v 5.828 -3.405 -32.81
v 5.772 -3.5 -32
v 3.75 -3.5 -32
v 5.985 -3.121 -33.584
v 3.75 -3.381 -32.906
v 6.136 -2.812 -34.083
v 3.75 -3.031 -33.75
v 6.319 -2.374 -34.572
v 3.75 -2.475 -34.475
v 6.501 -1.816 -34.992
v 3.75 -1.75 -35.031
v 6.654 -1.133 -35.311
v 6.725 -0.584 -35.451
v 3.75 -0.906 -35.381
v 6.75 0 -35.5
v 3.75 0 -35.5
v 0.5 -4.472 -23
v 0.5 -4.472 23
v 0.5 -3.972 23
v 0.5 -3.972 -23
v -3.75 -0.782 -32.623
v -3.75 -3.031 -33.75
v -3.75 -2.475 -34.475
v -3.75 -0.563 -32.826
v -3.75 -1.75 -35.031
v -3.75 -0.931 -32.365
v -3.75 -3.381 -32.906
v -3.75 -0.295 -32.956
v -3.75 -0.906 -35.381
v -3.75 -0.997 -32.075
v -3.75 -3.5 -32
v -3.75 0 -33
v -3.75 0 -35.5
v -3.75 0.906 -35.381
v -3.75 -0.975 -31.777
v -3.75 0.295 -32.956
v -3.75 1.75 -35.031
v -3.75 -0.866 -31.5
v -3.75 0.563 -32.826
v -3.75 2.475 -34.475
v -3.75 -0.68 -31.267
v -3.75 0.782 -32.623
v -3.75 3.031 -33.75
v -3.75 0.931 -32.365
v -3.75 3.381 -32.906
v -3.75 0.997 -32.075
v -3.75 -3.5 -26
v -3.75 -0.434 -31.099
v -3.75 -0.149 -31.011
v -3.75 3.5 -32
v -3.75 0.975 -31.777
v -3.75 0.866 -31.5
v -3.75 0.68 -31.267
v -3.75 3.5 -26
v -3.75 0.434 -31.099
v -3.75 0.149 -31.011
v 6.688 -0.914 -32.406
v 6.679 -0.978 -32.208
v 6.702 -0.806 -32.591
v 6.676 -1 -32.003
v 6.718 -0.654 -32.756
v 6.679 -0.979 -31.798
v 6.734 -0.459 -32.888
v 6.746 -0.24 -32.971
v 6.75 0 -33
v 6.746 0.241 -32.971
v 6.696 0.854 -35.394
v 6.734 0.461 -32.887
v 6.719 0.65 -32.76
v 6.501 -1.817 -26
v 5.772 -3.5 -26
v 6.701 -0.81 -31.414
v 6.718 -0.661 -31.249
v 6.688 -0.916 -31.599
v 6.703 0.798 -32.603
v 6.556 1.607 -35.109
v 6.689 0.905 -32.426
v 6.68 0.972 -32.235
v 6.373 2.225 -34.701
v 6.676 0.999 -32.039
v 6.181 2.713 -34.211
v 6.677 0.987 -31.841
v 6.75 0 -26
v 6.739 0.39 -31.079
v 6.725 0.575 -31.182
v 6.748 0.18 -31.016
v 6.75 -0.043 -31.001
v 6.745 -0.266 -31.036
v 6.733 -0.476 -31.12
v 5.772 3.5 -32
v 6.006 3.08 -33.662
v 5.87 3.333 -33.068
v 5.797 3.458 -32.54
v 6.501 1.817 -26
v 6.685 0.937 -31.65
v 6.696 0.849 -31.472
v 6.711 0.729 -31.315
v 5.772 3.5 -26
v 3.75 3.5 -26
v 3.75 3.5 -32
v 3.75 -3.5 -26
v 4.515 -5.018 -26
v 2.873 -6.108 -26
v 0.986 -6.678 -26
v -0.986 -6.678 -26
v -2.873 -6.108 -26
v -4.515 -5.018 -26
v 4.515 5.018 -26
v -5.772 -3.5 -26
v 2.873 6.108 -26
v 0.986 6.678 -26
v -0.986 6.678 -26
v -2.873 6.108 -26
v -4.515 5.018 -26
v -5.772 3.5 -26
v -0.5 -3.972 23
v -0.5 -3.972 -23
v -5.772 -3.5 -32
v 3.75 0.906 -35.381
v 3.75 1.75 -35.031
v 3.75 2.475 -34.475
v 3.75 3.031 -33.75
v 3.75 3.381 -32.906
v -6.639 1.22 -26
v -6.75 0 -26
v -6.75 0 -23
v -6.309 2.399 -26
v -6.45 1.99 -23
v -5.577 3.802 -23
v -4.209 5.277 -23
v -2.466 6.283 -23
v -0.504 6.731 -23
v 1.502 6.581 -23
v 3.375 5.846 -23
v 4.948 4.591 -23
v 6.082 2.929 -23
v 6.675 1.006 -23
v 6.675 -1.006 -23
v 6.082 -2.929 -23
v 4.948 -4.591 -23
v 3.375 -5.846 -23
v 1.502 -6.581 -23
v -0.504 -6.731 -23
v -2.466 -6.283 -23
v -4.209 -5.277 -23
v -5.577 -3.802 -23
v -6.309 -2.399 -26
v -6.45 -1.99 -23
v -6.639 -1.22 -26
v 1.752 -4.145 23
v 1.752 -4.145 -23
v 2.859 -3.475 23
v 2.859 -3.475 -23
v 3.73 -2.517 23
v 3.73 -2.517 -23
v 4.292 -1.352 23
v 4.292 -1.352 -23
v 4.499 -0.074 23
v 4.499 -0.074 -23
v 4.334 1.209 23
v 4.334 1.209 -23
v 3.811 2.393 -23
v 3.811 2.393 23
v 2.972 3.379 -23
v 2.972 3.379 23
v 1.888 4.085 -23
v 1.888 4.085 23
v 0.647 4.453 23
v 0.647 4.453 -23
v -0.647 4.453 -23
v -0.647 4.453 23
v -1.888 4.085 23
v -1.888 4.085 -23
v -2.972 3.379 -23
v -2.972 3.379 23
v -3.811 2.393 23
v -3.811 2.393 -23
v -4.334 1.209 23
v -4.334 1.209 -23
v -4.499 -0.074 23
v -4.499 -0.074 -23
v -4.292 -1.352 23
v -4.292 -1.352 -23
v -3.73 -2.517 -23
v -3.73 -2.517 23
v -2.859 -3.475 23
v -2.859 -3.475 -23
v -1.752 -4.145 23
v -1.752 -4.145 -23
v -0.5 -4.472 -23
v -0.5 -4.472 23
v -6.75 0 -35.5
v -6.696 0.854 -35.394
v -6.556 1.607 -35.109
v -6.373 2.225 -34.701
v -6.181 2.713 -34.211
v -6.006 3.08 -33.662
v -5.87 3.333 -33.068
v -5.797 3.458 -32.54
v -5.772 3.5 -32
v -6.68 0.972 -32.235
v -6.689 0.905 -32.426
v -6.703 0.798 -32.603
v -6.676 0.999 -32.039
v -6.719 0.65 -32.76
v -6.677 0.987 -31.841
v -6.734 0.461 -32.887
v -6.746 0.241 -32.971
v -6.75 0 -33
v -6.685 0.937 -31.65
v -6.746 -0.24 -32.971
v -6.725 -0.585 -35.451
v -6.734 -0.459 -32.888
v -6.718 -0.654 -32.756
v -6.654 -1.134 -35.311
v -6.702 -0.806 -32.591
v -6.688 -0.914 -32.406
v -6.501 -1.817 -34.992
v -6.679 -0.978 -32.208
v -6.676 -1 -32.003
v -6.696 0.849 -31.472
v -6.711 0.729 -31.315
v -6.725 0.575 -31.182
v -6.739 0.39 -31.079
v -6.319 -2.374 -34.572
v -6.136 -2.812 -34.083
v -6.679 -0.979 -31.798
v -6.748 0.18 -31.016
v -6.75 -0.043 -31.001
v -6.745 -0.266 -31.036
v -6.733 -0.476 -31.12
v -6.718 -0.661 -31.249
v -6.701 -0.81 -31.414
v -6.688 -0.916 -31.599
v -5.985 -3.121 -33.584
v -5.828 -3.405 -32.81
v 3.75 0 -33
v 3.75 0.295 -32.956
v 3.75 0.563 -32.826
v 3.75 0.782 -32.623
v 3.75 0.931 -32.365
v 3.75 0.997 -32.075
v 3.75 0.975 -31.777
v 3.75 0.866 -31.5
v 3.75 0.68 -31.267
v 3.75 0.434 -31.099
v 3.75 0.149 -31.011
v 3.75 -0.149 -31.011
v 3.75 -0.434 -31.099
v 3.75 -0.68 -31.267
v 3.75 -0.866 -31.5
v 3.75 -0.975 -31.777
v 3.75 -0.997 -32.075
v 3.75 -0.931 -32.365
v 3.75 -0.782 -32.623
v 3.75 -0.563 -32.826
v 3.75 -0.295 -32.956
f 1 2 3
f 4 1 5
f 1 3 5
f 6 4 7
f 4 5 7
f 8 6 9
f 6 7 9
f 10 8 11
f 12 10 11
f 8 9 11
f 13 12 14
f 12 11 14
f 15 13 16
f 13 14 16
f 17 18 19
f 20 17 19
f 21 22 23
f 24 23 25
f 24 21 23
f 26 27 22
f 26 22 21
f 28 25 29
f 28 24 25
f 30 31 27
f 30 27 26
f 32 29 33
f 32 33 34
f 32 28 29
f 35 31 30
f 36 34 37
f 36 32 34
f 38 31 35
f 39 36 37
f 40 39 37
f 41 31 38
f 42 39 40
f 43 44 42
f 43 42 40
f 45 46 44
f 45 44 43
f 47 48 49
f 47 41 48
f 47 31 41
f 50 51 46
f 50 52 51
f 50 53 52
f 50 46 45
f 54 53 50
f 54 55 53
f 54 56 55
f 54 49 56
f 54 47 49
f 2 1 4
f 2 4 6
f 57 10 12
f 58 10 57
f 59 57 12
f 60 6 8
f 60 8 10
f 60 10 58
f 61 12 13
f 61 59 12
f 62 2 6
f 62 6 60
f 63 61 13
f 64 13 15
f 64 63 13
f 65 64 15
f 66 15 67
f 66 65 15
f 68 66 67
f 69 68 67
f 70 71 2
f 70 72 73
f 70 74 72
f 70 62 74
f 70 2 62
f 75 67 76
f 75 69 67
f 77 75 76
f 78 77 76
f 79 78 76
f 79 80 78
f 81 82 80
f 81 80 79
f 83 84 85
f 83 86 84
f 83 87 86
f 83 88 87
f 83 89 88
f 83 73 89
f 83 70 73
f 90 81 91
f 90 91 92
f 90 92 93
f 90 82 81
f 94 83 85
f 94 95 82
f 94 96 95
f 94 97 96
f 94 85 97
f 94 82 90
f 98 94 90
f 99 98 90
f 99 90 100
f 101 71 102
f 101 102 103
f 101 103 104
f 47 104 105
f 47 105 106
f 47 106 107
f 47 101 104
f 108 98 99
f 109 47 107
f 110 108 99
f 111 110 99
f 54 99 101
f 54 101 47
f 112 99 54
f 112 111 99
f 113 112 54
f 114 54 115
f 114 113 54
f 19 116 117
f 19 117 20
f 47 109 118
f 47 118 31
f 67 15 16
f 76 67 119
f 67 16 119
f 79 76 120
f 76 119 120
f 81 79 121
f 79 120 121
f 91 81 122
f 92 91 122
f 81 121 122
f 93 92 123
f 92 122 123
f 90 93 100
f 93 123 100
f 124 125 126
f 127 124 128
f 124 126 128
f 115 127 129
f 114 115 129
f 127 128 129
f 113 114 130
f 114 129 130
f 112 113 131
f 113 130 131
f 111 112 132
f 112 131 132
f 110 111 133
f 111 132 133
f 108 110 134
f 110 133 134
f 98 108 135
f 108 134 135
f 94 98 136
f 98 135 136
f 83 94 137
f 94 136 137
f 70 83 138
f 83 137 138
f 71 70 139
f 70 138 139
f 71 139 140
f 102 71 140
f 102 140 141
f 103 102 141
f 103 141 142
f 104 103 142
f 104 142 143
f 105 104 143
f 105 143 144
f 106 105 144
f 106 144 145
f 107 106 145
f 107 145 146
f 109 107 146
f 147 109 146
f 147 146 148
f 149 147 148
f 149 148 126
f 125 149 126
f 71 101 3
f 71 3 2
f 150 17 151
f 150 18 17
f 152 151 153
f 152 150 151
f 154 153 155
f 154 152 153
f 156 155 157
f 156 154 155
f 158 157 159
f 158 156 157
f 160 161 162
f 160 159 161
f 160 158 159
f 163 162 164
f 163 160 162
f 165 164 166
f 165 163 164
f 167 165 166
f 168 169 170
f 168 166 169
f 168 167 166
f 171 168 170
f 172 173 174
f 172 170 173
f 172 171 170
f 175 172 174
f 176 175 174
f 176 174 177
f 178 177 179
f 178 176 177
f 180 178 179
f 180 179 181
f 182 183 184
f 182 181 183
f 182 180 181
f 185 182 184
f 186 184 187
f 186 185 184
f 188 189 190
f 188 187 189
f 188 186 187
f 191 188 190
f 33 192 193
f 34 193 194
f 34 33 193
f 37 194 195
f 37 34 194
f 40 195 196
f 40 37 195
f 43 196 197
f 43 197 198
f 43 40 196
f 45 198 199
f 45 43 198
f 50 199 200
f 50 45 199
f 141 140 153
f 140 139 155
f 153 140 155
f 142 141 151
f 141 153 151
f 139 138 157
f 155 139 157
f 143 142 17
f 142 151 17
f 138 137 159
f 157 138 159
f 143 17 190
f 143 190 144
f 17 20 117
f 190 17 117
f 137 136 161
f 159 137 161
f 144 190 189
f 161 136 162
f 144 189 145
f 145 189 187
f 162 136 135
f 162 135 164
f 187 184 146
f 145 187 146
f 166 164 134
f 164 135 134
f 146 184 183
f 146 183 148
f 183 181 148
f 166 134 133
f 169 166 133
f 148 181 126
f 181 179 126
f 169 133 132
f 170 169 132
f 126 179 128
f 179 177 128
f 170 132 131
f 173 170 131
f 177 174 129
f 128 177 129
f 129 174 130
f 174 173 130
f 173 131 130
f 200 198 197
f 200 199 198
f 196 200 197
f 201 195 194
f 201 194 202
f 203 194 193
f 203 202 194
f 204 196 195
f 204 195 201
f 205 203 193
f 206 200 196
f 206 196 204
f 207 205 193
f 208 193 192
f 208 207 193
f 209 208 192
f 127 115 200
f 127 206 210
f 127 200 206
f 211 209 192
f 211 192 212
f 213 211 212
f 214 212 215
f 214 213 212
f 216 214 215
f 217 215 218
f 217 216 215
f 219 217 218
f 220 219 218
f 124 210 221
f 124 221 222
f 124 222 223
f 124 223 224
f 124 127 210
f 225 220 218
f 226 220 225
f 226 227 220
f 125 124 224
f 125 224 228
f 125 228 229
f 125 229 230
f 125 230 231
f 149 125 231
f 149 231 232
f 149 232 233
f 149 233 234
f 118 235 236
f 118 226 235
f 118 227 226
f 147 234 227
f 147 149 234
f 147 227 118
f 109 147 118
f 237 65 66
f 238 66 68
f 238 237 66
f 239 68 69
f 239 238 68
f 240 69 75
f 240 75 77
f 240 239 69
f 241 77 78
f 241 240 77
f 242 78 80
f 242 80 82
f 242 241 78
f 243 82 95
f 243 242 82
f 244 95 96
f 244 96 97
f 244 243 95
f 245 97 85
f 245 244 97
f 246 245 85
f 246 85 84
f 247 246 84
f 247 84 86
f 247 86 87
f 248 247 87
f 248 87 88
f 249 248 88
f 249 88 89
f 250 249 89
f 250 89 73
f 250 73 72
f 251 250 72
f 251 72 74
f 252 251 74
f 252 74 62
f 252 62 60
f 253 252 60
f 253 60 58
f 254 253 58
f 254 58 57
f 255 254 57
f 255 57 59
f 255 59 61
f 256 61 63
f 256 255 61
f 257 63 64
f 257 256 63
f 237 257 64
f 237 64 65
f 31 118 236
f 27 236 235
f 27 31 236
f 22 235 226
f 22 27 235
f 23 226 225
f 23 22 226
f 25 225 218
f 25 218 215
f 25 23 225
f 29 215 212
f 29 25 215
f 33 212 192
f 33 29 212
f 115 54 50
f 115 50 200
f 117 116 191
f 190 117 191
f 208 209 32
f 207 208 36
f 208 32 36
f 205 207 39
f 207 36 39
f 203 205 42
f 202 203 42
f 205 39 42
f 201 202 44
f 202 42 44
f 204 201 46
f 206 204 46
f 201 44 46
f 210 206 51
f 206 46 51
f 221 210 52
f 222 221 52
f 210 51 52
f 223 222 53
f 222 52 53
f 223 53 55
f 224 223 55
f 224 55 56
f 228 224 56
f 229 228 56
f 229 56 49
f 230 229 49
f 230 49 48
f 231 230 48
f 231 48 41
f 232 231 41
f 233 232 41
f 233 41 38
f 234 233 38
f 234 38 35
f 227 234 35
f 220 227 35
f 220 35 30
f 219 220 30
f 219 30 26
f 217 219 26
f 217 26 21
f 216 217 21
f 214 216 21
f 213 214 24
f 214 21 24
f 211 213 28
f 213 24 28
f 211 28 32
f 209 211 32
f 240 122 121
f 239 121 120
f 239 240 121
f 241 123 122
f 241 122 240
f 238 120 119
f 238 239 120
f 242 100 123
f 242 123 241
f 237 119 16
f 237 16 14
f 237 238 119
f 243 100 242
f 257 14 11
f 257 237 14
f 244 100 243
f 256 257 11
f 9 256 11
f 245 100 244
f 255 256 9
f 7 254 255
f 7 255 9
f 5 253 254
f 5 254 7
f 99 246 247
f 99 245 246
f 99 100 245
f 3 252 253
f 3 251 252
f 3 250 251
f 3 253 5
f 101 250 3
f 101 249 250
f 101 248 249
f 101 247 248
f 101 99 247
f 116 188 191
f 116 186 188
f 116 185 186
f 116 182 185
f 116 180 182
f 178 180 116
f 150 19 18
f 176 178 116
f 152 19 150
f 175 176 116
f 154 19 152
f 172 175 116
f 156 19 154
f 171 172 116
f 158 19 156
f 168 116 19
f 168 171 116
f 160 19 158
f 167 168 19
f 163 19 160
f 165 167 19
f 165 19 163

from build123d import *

# Parameters (mm, degrees)
SKETCH1_R                = 4.5
YOKE_DEPTH               = 23
SKETCH2_R                = 6.75
U_JOINT_BASE_DEPTH       = 3
U_JOINT_STANDUPS_DEPTH   = 9.5
STANDUP_ROUND_DEPTH      = 7.75
STANDUP_ROUND_DEPTH_BACK = 7.75
SKETCH5_R                = 1
BALL_HOLES_DEPTH         = 7.75
BALL_HOLES_DEPTH_BACK    = 7.75
KEYWAY_DEPTH             = 46


with BuildPart() as part:
    # Sketch1 → Yoke (new body, symmetric)
    with BuildSketch(Plane.XY):
        Circle(SKETCH1_R)
    extrude(amount=YOKE_DEPTH, both=True)

    # Sketch2 → U Joint Base (add)
    with BuildSketch(Plane(origin=(0, 0, -23), x_dir=(-1, 0, 0), z_dir=(0, 0, -1))):
        Circle(SKETCH2_R)
    extrude(amount=U_JOINT_BASE_DEPTH)

    # Sketch3 → U Joint Standups (add)
    with BuildSketch(Plane(origin=(0, 0, -26), x_dir=(-1, 0, 0), z_dir=(0, 0, -1))):
        with BuildLine():
            Line((-5.771698, 3.5), (-3.75, 3.5))
            Line((-3.75, 3.5), (-3.75, -3.5))
            Line((-3.75, -3.5), (-5.771698, -3.5))
            ThreePointArc((-5.771698, -3.5), (-6.75, 0), (-5.771698, 3.5))
        make_face()
        with BuildLine():
            Line((3.75, -3.5), (3.75, 3.5))
            Line((3.75, 3.5), (5.771698, 3.5))
            ThreePointArc((5.771698, 3.5), (6.75, 0), (5.771698, -3.5))
            Line((5.771698, -3.5), (3.75, -3.5))
        make_face()
    extrude(amount=U_JOINT_STANDUPS_DEPTH)

    # Sketch4 → Standup Round (cut, two sides)
    with BuildSketch(Plane(origin=(0, 0, 0), x_dir=(0, 0, -1), z_dir=(1, 0, 0))) as standup_round_sk:
        with BuildLine():
            ThreePointArc((32, -3.5), (34.474874, -2.474874), (35.5, 0))
            Line((35.5, 0), (35.5, -3.5))
            Line((35.5, -3.5), (32, -3.5))
        make_face()
        with BuildLine():
            ThreePointArc((35.5, 0), (34.474874, 2.474874), (32, 3.5))
            Line((32, 3.5), (35.5, 3.5))
            Line((35.5, 3.5), (35.5, 0))
        make_face()
    extrude(amount=STANDUP_ROUND_DEPTH, mode=Mode.SUBTRACT)
    extrude(standup_round_sk.sketch, amount=-STANDUP_ROUND_DEPTH_BACK, mode=Mode.SUBTRACT)

    # Sketch5 → Ball Holes (cut, two sides)
    with BuildSketch(Plane(origin=(0, 0, 0), x_dir=(0, 0, -1), z_dir=(1, 0, 0))) as ball_holes_sk:
        with Locations((32, 0)):
            Circle(SKETCH5_R)
    extrude(amount=BALL_HOLES_DEPTH, mode=Mode.SUBTRACT)
    extrude(ball_holes_sk.sketch, amount=-BALL_HOLES_DEPTH_BACK, mode=Mode.SUBTRACT)

    # Sketch6 → Keyway (cut)
    with BuildSketch(Plane.XY.offset(23)):
        Polygon((0.5, -4.472136), (0.5, -4.702036), (-0.5, -4.702036), (-0.5, -4.472136), (-0.5, -3.972136), (0.5, -3.972136), align=None)
    extrude(amount=-KEYWAY_DEPTH, mode=Mode.SUBTRACT)


solid = part.part
